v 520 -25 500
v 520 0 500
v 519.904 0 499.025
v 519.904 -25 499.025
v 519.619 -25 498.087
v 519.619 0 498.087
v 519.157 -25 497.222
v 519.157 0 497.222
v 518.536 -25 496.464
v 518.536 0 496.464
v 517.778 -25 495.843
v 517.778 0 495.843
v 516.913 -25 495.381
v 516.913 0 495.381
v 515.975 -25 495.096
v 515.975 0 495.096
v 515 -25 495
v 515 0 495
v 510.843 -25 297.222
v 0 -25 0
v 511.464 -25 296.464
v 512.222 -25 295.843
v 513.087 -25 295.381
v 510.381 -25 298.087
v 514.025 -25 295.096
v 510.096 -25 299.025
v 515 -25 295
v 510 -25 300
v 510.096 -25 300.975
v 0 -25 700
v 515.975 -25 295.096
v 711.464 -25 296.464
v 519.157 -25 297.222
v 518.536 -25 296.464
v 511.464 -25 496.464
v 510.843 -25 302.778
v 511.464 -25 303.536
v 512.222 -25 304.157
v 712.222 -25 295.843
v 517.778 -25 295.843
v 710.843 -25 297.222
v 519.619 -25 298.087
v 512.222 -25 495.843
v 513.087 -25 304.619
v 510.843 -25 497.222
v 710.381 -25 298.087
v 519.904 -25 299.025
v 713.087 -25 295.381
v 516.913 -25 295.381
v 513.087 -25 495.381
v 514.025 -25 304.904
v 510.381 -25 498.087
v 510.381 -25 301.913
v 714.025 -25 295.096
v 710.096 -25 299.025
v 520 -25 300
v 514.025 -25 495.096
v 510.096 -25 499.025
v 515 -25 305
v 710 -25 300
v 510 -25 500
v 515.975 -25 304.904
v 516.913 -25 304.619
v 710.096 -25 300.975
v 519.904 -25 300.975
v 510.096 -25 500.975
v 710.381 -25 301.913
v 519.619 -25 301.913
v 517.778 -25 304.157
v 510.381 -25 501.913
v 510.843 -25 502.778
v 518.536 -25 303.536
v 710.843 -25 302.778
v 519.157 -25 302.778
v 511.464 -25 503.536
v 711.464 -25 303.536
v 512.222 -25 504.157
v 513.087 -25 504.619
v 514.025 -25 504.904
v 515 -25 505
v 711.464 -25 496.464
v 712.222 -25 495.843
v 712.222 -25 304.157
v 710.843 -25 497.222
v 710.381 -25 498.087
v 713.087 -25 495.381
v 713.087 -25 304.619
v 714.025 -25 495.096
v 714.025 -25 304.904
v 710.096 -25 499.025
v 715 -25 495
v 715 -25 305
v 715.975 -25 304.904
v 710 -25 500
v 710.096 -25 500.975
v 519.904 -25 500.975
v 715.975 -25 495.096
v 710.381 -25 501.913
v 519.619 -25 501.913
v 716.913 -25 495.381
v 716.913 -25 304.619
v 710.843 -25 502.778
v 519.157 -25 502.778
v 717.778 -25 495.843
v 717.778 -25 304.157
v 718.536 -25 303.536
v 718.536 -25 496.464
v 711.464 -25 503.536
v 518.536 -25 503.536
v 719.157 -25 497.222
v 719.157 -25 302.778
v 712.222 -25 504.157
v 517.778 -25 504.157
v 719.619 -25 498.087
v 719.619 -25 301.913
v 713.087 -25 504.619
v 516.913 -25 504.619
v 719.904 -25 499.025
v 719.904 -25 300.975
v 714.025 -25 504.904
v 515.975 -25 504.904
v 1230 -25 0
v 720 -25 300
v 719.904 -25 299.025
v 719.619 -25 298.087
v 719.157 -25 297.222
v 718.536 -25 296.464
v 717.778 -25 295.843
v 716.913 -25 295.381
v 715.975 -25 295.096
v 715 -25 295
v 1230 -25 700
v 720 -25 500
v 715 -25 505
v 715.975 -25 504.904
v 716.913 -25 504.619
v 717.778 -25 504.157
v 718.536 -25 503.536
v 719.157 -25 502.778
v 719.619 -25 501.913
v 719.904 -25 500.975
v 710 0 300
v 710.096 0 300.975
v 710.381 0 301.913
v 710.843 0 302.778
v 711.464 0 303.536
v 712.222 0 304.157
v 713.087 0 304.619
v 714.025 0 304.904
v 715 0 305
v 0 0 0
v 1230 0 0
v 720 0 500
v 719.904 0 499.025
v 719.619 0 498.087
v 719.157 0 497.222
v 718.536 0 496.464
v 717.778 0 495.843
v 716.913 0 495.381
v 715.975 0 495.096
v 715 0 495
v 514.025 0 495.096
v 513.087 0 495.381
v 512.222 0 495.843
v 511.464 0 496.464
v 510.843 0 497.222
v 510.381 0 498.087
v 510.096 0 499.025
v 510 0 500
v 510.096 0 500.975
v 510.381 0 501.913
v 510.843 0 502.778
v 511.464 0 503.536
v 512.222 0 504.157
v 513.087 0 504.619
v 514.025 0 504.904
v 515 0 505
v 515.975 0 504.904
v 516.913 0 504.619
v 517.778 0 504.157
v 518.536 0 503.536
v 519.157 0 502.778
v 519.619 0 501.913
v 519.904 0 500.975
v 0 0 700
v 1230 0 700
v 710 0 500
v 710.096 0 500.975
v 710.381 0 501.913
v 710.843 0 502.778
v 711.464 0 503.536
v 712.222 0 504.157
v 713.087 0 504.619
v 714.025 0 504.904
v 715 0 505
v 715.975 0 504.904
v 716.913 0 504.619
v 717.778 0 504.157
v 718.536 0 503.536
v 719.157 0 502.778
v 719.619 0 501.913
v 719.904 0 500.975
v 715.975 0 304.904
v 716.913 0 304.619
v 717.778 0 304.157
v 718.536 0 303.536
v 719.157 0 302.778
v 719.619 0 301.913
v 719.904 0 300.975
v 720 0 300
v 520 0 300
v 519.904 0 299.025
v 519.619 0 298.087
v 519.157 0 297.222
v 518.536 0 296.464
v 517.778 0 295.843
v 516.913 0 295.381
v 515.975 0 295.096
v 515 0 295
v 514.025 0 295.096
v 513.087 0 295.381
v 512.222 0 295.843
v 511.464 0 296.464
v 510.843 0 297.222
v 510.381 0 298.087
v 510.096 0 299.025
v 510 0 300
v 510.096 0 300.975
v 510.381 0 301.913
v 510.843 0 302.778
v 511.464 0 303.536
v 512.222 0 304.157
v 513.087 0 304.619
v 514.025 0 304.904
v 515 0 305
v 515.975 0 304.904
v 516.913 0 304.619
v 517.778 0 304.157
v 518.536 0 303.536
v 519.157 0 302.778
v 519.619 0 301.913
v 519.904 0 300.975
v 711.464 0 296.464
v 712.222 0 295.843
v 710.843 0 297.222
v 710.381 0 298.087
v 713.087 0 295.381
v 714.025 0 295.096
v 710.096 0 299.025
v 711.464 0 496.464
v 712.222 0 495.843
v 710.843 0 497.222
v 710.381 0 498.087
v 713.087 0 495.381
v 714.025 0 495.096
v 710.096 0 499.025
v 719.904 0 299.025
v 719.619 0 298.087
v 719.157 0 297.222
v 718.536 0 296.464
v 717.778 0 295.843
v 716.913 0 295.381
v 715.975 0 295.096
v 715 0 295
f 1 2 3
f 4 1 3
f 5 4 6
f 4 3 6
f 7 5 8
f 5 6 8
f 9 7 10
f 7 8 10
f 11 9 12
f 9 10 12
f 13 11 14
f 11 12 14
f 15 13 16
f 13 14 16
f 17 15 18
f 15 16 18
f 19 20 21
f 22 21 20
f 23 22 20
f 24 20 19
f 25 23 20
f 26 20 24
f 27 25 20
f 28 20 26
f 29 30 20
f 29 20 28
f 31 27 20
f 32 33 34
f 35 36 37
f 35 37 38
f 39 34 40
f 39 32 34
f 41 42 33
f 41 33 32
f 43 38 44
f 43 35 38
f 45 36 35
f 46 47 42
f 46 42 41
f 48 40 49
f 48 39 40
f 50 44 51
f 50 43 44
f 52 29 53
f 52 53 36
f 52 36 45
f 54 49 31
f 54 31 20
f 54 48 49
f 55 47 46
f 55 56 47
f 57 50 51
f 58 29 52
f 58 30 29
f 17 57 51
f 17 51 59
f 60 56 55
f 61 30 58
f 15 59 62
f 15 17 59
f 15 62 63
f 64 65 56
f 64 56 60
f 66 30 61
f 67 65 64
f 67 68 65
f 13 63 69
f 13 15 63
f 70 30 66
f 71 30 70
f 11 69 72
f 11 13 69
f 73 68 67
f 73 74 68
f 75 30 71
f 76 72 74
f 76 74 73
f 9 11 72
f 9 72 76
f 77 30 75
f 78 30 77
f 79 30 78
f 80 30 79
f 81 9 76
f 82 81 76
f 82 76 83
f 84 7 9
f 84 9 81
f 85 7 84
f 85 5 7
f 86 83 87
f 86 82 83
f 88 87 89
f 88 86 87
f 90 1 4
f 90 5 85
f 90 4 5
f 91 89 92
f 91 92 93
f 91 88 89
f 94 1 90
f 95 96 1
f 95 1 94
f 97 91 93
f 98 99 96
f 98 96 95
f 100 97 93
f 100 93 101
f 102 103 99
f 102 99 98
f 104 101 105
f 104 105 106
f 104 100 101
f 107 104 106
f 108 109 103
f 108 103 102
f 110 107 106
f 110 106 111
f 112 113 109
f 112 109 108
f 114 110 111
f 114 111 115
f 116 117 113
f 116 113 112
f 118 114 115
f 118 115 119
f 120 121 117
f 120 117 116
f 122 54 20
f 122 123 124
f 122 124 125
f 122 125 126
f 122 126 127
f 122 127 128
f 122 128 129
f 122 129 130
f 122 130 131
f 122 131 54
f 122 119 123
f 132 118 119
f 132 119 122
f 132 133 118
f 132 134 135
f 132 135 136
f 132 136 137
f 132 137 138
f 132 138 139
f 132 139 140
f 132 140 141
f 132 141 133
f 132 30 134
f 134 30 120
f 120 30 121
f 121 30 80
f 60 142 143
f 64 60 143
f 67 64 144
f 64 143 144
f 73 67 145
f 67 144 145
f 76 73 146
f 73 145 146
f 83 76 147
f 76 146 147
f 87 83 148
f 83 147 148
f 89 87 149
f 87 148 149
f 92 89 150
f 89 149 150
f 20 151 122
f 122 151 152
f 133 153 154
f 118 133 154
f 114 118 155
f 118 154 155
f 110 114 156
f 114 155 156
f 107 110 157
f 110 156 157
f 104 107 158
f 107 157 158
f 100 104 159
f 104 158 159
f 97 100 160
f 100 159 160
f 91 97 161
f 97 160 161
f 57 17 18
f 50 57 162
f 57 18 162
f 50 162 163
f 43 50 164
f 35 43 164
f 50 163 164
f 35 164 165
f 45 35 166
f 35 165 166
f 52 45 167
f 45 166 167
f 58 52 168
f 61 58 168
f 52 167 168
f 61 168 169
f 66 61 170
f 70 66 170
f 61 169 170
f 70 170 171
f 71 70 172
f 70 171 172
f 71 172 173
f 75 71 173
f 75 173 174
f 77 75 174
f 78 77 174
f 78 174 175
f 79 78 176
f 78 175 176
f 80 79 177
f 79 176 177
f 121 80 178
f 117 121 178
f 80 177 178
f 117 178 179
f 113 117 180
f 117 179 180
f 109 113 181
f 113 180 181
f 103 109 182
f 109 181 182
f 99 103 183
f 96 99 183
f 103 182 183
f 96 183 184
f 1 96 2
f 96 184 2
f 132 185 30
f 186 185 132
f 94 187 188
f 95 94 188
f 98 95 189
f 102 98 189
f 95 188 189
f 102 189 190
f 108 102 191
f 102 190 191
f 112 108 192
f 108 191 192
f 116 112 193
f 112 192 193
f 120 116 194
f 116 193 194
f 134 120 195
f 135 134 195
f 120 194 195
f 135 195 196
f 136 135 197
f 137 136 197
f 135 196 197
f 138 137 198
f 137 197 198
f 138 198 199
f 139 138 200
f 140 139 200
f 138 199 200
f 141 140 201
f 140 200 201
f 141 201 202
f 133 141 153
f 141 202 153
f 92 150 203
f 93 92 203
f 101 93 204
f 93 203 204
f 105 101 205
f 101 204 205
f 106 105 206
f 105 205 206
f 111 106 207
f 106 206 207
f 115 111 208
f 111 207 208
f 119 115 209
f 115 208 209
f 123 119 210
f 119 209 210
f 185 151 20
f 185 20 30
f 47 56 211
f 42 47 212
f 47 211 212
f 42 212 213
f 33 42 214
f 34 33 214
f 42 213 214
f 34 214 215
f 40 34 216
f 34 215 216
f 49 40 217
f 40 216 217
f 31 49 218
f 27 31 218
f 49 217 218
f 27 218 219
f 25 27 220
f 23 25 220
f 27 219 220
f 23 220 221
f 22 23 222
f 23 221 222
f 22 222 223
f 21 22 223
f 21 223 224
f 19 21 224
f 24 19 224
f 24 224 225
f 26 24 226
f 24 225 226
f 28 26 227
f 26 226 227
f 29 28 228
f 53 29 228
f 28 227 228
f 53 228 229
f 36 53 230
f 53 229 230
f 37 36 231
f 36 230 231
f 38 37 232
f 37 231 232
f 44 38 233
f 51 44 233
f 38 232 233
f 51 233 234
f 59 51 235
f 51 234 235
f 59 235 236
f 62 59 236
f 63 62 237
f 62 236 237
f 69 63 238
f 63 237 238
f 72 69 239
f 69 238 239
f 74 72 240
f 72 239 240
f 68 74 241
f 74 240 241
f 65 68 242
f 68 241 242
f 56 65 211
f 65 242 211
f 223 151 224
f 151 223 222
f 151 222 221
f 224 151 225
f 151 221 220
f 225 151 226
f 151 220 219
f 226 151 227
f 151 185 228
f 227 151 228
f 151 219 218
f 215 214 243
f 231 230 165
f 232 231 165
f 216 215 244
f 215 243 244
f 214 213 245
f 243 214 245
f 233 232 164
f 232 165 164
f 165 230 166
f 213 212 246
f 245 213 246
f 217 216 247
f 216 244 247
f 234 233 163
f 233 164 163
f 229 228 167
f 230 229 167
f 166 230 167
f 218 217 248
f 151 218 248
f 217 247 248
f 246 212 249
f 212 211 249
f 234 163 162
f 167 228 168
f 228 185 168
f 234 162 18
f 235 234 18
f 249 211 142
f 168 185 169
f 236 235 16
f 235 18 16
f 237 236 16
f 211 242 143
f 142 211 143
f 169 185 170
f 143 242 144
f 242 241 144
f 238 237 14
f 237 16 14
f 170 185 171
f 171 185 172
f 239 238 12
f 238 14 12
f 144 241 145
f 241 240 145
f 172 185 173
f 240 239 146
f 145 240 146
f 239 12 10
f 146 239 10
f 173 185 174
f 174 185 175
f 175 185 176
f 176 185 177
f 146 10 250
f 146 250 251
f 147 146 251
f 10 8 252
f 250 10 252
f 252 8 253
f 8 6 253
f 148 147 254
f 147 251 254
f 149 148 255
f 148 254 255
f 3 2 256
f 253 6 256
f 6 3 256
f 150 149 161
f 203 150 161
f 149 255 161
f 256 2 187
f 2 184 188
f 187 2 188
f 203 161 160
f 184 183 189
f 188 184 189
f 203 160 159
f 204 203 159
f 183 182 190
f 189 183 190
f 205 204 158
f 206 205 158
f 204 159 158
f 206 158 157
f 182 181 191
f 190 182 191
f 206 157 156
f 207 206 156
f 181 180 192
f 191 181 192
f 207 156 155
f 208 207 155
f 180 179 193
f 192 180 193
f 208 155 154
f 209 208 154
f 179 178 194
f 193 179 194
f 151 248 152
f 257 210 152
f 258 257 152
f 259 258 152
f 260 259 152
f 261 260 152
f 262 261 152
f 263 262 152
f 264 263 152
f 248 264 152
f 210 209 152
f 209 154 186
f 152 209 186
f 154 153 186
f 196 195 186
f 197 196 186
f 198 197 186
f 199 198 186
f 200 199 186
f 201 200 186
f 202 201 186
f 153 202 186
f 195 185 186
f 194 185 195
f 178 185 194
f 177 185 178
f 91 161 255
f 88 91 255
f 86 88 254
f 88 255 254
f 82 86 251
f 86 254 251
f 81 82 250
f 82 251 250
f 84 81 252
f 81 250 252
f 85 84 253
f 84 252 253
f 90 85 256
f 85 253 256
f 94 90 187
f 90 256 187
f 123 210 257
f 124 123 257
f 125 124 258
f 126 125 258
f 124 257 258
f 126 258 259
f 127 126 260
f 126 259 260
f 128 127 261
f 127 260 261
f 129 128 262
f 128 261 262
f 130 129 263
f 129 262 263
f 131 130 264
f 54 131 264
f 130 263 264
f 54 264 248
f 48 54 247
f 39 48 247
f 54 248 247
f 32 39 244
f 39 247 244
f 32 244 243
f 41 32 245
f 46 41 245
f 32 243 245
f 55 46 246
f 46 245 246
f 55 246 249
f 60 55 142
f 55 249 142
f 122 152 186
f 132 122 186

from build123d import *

# Parameters (mm, degrees)
F0_W     = 1230
F0_H     = 700
F1_DEPTH = 25


with BuildPart() as f1:
    # F0 (on Front) → F1 (new body)
    with BuildSketch(Plane.XZ):
        with Locations((615, 350)):
            Rectangle(F0_W, F0_H)
        with BuildLine():
            ThreePointArc((515, 495), (511.4644660941, 503.5355339059), (520, 500))
            Line((520, 500), (710, 500))
            ThreePointArc((710, 500), (715, 505), (720, 500))
            ThreePointArc((720, 500), (718.5355339059, 496.4644660941), (715, 495))
            Line((715, 495), (715, 305))
            ThreePointArc((715, 305), (718.5355339059, 303.5355339059), (720, 300))
            ThreePointArc((720, 300), (715, 295), (710, 300))
            Line((710, 300), (520, 300))
            ThreePointArc((520, 300), (511.4644660941, 296.4644660941), (515, 305))
            Line((515, 305), (515, 495))
        make_face(mode=Mode.SUBTRACT)
        with BuildLine():
            Line((710, 500), (520, 500))
            ThreePointArc((520, 500), (518.5355339059, 496.4644660941), (515, 495))
            Line((515, 495), (515, 305))
            ThreePointArc((515, 305), (518.5355339059, 303.5355339059), (520, 300))
            Line((520, 300), (710, 300))
            ThreePointArc((710, 300), (711.4644660941, 303.5355339059), (715, 305))
            Line((715, 305), (715, 495))
            ThreePointArc((715, 495), (711.4644660941, 496.4644660941), (710, 500))
        make_face()
    extrude(amount=F1_DEPTH)


solid = f1.part
